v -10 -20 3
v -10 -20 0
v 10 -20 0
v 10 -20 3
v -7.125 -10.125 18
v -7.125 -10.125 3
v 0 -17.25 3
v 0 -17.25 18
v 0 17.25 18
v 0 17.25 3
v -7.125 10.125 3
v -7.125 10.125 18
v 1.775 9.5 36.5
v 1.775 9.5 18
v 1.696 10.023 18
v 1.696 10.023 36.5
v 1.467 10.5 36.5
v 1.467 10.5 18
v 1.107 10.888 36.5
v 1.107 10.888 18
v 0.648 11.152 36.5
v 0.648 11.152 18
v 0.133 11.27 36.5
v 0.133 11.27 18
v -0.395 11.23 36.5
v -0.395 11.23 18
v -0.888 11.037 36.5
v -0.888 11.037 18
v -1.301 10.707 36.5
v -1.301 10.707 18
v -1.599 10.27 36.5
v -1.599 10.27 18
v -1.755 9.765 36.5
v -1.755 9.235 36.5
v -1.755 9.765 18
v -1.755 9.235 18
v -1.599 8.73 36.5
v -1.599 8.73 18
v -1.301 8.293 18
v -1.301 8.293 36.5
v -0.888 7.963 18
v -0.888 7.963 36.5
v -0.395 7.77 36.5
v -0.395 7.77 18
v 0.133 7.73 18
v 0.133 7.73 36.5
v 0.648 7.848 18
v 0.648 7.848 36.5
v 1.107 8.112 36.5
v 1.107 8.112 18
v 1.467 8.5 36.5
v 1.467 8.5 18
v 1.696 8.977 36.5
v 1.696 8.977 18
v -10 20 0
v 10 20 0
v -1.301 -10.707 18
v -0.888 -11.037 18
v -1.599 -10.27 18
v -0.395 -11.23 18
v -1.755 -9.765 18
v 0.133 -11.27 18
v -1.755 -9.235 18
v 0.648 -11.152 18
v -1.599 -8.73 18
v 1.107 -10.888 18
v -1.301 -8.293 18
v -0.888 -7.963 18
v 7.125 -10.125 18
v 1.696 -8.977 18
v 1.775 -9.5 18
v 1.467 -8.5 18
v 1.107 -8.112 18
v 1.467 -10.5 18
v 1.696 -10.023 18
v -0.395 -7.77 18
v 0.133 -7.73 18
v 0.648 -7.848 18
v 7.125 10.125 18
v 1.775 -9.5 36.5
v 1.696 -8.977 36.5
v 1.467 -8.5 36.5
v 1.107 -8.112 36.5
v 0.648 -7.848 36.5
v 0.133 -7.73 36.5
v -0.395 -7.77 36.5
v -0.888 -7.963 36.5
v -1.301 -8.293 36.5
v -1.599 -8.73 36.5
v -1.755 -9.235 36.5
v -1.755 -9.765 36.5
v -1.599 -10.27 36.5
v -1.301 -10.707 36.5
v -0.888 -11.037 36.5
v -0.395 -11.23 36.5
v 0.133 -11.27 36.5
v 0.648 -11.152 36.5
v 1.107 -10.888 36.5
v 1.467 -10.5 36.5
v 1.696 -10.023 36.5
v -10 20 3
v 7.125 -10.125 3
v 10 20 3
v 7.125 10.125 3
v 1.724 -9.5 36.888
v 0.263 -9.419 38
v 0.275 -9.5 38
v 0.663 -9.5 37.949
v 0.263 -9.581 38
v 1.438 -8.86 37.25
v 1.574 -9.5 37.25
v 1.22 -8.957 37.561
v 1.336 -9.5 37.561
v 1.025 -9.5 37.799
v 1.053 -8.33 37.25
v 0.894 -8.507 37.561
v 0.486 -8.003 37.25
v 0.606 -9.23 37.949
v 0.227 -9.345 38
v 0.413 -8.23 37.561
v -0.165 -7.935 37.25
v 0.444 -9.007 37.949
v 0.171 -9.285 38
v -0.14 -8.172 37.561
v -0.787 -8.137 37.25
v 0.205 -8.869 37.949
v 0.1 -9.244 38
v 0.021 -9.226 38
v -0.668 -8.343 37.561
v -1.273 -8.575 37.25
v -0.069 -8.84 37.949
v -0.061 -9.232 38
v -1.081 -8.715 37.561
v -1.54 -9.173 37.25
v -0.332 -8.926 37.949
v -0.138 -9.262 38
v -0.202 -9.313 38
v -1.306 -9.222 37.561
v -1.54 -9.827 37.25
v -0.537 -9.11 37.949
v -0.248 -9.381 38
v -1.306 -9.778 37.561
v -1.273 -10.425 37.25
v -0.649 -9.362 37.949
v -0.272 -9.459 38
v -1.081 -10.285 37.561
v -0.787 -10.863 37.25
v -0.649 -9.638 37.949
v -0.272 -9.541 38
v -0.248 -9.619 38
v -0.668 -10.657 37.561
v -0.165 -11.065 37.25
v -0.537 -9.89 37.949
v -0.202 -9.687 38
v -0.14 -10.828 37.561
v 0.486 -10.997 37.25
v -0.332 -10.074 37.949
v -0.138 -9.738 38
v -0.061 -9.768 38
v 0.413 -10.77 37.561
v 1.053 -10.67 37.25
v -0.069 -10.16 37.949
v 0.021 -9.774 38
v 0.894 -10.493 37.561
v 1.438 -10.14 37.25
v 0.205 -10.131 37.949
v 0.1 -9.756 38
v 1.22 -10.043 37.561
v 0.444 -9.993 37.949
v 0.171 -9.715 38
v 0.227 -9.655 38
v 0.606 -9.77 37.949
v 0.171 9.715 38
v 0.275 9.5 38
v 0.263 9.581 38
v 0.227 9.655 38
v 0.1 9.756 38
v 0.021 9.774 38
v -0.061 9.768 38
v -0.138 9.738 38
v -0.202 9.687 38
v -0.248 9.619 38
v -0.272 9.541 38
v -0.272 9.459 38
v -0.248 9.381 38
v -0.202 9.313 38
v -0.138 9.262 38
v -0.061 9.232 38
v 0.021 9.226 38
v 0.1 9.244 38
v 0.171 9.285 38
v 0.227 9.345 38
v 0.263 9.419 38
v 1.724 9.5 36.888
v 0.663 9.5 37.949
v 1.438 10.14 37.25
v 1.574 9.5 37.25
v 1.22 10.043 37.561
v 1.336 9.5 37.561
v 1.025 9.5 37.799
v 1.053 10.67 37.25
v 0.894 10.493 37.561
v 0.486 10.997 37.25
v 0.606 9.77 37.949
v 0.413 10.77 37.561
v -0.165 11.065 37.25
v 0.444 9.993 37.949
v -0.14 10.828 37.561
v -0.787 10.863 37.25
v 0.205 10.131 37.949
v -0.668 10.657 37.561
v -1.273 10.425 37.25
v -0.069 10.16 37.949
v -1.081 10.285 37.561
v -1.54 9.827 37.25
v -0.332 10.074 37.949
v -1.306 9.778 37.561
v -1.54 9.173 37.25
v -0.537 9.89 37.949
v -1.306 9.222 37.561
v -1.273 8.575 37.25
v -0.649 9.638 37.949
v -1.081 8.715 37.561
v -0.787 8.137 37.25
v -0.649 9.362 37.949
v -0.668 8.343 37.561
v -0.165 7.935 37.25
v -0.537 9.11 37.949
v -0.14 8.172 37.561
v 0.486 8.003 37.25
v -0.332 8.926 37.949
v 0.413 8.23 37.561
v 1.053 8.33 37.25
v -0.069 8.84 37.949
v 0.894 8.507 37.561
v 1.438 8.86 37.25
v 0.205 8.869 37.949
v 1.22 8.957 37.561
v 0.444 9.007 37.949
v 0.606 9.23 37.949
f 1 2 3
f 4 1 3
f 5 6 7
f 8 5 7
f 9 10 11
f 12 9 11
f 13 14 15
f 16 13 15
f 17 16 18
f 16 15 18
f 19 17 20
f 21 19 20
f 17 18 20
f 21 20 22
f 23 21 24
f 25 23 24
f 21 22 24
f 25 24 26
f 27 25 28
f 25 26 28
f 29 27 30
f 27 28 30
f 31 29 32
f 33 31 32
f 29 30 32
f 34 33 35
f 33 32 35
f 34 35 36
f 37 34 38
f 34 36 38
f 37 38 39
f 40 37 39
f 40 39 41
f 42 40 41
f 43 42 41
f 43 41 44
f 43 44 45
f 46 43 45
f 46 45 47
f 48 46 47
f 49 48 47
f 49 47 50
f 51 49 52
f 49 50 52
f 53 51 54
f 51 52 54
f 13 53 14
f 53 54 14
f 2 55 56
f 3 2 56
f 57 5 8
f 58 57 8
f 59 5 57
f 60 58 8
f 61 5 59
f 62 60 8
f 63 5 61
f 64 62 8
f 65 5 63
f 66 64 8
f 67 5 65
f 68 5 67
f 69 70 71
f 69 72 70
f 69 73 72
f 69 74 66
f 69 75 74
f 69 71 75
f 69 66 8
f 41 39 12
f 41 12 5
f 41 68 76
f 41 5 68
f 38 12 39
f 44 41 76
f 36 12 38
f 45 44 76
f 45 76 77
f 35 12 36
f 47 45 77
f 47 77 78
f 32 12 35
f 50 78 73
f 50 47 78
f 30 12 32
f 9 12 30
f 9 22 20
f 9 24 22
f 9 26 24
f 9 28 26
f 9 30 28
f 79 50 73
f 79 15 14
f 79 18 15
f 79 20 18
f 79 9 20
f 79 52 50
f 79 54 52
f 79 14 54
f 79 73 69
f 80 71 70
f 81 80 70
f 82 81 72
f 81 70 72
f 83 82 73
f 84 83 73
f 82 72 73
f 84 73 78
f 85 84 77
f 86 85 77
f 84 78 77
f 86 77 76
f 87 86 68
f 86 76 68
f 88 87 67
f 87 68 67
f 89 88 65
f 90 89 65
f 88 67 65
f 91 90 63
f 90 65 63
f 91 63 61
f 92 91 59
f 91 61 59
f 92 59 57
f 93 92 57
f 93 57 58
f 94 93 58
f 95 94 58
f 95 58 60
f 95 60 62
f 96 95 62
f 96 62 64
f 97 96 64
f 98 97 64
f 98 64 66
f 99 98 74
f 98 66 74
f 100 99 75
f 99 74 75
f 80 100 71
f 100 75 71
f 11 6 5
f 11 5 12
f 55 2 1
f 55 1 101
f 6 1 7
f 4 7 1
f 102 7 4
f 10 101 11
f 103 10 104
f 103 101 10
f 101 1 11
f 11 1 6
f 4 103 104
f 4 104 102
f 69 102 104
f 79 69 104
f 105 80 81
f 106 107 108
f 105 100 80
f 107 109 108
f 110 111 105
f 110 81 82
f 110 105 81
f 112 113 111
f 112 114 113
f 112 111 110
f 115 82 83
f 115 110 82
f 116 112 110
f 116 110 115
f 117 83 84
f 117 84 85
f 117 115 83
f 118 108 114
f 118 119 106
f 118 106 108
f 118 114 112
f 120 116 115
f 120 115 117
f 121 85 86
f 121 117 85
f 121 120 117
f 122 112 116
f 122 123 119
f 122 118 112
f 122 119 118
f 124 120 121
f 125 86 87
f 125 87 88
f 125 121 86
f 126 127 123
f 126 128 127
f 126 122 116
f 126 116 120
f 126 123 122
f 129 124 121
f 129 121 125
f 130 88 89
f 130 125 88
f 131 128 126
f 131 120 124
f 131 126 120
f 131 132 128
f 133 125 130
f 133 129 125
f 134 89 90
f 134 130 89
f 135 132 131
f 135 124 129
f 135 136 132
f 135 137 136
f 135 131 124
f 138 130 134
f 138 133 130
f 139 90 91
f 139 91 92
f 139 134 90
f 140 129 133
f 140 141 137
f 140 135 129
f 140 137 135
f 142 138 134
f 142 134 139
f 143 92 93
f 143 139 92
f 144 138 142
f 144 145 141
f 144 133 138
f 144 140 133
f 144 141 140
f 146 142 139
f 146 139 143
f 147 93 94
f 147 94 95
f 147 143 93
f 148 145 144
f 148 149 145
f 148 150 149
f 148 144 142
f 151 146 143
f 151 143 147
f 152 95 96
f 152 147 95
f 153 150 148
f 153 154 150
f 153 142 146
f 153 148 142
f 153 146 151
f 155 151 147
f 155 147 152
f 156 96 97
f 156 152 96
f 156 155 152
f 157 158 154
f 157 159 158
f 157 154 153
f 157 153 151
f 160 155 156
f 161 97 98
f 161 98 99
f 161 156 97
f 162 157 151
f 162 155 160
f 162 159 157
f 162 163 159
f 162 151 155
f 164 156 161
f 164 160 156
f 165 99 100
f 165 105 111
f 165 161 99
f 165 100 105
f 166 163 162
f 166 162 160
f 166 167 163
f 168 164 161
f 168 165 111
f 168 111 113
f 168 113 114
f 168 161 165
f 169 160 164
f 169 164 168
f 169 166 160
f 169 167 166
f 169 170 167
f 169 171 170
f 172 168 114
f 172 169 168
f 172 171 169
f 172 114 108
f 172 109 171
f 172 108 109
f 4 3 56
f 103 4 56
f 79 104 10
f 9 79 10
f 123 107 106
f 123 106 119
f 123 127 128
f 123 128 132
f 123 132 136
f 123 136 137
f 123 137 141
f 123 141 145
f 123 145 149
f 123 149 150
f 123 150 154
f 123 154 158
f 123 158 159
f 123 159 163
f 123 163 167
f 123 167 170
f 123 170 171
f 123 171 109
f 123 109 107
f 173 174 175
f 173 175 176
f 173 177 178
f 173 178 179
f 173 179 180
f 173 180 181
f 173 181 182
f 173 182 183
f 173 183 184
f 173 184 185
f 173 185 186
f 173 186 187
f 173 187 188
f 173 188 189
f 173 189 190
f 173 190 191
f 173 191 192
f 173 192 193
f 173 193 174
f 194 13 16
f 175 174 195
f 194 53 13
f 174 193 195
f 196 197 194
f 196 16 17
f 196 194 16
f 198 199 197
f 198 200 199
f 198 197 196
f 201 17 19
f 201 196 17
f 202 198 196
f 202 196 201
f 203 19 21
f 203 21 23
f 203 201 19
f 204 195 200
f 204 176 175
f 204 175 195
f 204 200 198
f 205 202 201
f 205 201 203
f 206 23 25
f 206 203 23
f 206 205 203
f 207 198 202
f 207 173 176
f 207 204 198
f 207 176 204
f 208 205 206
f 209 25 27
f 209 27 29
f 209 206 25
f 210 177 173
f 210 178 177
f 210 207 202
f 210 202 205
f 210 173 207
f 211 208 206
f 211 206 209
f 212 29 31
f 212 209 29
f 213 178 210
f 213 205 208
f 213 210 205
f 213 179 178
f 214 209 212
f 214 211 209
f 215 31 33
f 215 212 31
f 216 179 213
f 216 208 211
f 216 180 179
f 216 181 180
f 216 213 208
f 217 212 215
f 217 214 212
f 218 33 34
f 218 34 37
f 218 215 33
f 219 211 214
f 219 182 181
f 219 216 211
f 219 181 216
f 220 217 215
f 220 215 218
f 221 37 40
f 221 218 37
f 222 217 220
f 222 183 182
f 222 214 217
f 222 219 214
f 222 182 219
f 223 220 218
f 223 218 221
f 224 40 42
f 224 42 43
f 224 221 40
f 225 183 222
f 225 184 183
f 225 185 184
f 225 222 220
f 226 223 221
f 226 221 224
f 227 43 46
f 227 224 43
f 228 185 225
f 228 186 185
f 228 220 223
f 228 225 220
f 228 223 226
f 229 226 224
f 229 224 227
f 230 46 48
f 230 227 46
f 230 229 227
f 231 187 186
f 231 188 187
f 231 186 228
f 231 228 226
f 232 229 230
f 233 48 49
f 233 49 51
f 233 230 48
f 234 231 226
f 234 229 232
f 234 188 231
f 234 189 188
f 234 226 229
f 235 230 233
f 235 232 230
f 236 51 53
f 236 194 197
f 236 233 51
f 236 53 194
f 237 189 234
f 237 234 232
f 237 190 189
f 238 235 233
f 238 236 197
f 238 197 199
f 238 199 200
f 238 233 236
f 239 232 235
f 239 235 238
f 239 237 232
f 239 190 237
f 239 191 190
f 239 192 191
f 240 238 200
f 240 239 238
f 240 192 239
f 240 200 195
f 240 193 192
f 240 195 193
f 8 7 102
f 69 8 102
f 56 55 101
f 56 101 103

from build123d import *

# Parameters (mm, degrees)
F0_W     = 14.25
F0_H     = 20.25
F1_DEPTH = 18
F2_W     = 20
F2_H     = 40
F3_DEPTH = 3
F4_R     = 1.775
F5_DEPTH = 20
F6_R     = 1.5


with BuildPart() as f1:
    # F0 (on Top) → F1 (new body)
    with BuildSketch(Plane.XY):
        Polygon((7.125, -10.125), (-7.125, -10.125), (0, -17.25), align=None)
        Polygon((0, 17.25), (-7.125, 10.125), (7.125, 10.125), align=None)
        Rectangle(F0_W, F0_H)
    extrude(amount=F1_DEPTH)

    # F2 (on Top) → F3 (join)
    with BuildSketch(Plane.XY):
        Rectangle(F2_W, F2_H)
    extrude(amount=F3_DEPTH)

    # F4 (on face) → F5 (join)
    with BuildSketch(Plane.XY.offset(18)):
        with Locations((0, 9.5)):
            Circle(F4_R)
        with Locations((0, -9.5)):
            Circle(F4_R)
    extrude(amount=F5_DEPTH)

    # F6
    f6_edges = [f1.edges().sort_by_distance(p)[0] for p in [
        (-1.775, -9.5, 38),
        (-1.775, 9.5, 38),
    ]]
    fillet(f6_edges, radius=F6_R)


solid = f1.part
